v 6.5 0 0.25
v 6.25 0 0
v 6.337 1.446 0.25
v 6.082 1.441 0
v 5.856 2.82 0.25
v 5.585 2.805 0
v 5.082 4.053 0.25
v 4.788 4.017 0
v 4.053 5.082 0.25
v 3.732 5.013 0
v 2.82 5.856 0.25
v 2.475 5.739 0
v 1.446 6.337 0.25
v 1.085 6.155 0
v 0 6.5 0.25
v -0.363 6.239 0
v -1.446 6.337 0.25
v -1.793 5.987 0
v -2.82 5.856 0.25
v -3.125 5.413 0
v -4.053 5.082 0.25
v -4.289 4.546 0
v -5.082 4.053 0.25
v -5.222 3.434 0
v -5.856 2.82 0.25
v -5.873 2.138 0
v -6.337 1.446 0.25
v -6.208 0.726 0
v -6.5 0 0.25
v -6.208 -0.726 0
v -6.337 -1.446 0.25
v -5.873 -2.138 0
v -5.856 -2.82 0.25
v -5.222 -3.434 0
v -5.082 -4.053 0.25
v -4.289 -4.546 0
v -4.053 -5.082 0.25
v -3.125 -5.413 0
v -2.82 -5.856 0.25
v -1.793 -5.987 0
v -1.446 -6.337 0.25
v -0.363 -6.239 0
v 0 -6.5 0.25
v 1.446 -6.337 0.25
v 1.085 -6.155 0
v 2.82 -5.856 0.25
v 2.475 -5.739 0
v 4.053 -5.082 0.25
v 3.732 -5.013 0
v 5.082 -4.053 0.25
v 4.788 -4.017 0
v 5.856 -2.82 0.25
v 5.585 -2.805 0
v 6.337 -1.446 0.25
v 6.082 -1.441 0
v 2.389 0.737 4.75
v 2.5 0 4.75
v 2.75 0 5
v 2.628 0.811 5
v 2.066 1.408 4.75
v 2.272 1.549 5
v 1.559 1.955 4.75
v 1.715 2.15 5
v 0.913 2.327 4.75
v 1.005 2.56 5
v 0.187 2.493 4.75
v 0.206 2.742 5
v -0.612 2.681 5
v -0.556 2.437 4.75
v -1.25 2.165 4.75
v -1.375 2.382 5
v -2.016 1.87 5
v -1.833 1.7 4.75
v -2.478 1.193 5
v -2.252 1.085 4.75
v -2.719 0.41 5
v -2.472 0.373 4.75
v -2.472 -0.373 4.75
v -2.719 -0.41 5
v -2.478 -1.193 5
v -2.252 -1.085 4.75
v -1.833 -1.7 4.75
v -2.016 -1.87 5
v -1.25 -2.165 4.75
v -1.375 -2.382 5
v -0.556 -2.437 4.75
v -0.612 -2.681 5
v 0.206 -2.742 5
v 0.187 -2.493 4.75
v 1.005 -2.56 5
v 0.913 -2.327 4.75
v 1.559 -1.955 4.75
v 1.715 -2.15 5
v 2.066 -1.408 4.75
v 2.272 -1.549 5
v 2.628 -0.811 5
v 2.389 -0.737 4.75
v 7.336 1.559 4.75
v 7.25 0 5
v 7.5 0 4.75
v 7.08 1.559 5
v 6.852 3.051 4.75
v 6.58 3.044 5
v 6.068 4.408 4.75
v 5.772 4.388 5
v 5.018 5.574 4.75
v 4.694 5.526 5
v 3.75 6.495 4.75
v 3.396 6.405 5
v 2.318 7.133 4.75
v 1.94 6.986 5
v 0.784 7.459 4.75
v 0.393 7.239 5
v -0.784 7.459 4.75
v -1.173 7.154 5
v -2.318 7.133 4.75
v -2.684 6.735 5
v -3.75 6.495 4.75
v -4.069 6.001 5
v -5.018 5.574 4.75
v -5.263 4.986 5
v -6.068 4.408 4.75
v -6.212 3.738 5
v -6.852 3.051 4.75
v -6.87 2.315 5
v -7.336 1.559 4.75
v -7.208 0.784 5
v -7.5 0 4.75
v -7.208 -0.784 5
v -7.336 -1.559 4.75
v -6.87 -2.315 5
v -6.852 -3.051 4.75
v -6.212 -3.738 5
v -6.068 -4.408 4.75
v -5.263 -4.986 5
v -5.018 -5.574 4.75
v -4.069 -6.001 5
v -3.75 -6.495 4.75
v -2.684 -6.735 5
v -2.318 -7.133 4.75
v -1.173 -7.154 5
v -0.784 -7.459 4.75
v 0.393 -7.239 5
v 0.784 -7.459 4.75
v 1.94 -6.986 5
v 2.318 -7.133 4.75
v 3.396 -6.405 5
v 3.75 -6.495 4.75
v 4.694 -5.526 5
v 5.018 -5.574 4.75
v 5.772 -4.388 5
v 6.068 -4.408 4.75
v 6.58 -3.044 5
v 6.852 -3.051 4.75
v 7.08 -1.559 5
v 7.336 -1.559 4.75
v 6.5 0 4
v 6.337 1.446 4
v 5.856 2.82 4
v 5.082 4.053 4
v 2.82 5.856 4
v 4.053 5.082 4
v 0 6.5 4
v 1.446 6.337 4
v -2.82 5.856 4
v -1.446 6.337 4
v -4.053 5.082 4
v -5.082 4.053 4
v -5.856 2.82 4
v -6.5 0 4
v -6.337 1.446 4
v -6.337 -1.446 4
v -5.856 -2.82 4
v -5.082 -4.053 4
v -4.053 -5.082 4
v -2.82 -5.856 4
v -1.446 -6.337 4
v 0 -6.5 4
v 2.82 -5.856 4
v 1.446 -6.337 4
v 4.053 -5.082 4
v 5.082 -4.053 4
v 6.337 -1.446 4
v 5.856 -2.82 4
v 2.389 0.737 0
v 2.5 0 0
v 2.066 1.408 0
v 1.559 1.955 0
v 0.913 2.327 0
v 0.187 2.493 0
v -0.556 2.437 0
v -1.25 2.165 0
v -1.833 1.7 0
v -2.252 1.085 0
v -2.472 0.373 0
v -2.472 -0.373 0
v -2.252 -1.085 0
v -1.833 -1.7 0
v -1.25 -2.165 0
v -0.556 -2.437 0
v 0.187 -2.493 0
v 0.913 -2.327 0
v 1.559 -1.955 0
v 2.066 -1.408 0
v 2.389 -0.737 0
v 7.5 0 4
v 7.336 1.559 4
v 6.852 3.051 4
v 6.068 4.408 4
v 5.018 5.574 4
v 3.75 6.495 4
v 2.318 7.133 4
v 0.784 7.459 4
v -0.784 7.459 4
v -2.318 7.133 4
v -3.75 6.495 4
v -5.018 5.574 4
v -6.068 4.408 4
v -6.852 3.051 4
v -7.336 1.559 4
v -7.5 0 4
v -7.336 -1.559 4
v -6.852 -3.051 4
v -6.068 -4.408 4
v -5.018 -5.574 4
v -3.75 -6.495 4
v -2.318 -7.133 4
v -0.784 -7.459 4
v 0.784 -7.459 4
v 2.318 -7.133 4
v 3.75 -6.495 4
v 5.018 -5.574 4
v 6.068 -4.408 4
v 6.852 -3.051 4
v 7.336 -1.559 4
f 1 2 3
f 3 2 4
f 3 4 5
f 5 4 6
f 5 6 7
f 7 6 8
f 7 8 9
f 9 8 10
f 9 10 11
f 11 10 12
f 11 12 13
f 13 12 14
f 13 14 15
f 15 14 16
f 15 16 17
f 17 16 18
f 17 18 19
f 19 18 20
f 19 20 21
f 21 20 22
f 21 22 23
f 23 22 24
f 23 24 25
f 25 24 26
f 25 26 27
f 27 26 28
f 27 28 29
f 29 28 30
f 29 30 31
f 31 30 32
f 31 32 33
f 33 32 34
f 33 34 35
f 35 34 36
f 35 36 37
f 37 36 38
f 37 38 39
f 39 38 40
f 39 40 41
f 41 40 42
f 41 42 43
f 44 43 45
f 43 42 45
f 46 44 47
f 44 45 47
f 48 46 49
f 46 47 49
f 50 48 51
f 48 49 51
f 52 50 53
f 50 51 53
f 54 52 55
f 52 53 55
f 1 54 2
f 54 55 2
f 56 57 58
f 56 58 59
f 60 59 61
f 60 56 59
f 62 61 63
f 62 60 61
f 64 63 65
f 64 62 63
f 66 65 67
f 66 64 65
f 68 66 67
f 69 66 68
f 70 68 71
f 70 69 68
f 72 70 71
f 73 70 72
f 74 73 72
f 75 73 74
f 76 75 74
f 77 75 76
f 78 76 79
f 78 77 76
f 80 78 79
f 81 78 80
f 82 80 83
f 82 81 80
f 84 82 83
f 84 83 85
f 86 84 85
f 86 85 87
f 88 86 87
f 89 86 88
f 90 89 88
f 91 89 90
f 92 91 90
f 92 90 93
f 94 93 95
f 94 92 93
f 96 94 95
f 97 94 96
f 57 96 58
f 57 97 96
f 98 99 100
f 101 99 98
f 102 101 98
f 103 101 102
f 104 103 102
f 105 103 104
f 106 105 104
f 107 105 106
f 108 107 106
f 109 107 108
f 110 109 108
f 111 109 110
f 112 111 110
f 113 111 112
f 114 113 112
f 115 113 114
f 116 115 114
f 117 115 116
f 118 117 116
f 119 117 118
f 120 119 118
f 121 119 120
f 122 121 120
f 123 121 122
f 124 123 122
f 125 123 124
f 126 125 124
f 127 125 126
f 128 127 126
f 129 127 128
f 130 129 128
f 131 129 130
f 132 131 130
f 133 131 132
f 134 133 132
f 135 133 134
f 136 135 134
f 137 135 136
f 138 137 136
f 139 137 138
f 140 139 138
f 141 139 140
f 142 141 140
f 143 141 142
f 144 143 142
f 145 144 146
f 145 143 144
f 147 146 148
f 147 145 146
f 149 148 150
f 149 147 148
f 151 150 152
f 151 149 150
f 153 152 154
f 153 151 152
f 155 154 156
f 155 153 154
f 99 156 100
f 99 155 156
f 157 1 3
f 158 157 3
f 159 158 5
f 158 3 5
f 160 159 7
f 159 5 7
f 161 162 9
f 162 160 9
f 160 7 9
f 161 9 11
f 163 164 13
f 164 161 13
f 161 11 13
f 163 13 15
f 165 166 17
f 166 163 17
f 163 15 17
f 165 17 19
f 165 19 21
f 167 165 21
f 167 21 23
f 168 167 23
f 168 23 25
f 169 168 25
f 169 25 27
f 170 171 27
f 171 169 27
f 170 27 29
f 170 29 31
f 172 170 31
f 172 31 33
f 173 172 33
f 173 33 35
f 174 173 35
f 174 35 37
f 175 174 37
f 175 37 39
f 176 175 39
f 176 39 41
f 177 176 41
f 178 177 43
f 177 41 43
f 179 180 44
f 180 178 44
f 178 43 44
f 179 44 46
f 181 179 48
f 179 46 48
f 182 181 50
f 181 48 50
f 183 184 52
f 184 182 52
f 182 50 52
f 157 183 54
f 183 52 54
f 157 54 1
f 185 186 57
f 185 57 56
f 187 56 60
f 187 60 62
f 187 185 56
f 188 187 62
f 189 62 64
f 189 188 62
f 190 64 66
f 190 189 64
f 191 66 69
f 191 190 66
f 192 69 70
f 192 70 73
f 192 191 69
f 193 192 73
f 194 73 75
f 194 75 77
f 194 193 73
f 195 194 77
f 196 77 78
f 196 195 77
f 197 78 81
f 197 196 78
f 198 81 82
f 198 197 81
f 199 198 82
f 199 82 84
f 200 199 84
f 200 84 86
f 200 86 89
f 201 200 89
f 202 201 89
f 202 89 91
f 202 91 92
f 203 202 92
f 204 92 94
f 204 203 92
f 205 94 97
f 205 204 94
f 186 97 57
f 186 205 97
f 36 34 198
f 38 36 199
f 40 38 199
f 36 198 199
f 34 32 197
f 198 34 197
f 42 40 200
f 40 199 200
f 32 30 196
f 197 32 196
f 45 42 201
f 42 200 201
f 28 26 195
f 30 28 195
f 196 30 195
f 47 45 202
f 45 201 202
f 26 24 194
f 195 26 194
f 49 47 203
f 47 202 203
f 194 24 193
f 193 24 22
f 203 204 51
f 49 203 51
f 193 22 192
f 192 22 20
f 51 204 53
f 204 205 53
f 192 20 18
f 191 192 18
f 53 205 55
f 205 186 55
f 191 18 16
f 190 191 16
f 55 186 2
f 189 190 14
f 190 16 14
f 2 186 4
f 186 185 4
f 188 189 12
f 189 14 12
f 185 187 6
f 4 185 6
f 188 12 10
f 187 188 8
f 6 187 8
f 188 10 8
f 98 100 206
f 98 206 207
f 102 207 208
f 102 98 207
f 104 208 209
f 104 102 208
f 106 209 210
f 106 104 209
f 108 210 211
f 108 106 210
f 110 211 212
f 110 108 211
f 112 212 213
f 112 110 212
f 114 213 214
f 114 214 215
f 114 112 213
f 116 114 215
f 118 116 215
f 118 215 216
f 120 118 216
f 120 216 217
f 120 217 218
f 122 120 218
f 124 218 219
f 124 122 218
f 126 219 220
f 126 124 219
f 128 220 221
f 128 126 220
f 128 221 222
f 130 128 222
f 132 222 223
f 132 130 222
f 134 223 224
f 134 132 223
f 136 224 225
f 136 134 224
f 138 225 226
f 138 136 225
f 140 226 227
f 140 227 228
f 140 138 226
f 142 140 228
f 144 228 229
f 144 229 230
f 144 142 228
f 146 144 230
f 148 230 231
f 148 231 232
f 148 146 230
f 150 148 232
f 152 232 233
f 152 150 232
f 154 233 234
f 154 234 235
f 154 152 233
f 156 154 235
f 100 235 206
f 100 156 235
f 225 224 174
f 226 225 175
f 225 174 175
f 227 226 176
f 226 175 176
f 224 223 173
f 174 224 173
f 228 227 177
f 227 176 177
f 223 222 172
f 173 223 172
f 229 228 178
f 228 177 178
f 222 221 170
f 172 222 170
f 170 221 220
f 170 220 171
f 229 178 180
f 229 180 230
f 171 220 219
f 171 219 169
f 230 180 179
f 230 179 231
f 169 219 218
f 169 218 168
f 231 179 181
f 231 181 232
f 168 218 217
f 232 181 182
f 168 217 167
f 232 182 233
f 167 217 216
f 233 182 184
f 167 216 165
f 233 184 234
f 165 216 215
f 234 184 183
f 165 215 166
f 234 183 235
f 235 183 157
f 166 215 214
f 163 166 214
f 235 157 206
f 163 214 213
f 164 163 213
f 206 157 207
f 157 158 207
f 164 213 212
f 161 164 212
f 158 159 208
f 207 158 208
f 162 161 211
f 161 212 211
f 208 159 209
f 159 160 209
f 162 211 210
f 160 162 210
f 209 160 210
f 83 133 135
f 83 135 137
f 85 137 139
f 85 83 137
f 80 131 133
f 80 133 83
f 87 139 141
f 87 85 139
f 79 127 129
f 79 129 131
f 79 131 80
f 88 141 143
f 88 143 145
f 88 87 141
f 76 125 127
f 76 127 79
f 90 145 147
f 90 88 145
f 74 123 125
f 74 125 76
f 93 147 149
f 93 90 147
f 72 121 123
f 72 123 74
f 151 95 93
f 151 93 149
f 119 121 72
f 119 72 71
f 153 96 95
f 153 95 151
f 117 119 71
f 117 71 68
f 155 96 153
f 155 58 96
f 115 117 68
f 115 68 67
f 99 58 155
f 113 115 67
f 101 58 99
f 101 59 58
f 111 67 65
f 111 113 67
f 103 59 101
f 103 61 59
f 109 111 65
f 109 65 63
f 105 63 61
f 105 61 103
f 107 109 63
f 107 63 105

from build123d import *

# Parameters (mm, degrees)
ESQUISSE1_R        = 6.5
ESQUISSE1_R_2      = 2.5
BOSS_EXTRU_1_DEPTH = 5
ESQUISSE2_R        = 7.5
ESQUISSE2_R_2      = 3
BOSS_EXTRU_2_DEPTH = 1
CHANFREIN1_SIZE    = 0.25


with BuildPart() as part:
    # Esquisse1 → Boss.-Extru.1 (new body)
    with BuildSketch(Plane.XY):
        Circle(ESQUISSE1_R)
        Circle(ESQUISSE1_R_2, mode=Mode.SUBTRACT)
    extrude(amount=BOSS_EXTRU_1_DEPTH)

    # Esquisse2 → Boss.-Extru.2 (add)
    with BuildSketch(Plane.XY.offset(5)):
        Circle(ESQUISSE2_R)
        Circle(ESQUISSE2_R_2, mode=Mode.SUBTRACT)
    extrude(amount=-BOSS_EXTRU_2_DEPTH)

    # Chanfrein1
    chanfrein1_edges = [part.edges().sort_by_distance(p)[0] for p in [
        (-7.5, 0, 5),
        (-6.5, 0, 0),
        (-2.5, 0, 5),
    ]]
    chamfer(chanfrein1_edges, length=CHANFREIN1_SIZE)


solid = part.part
